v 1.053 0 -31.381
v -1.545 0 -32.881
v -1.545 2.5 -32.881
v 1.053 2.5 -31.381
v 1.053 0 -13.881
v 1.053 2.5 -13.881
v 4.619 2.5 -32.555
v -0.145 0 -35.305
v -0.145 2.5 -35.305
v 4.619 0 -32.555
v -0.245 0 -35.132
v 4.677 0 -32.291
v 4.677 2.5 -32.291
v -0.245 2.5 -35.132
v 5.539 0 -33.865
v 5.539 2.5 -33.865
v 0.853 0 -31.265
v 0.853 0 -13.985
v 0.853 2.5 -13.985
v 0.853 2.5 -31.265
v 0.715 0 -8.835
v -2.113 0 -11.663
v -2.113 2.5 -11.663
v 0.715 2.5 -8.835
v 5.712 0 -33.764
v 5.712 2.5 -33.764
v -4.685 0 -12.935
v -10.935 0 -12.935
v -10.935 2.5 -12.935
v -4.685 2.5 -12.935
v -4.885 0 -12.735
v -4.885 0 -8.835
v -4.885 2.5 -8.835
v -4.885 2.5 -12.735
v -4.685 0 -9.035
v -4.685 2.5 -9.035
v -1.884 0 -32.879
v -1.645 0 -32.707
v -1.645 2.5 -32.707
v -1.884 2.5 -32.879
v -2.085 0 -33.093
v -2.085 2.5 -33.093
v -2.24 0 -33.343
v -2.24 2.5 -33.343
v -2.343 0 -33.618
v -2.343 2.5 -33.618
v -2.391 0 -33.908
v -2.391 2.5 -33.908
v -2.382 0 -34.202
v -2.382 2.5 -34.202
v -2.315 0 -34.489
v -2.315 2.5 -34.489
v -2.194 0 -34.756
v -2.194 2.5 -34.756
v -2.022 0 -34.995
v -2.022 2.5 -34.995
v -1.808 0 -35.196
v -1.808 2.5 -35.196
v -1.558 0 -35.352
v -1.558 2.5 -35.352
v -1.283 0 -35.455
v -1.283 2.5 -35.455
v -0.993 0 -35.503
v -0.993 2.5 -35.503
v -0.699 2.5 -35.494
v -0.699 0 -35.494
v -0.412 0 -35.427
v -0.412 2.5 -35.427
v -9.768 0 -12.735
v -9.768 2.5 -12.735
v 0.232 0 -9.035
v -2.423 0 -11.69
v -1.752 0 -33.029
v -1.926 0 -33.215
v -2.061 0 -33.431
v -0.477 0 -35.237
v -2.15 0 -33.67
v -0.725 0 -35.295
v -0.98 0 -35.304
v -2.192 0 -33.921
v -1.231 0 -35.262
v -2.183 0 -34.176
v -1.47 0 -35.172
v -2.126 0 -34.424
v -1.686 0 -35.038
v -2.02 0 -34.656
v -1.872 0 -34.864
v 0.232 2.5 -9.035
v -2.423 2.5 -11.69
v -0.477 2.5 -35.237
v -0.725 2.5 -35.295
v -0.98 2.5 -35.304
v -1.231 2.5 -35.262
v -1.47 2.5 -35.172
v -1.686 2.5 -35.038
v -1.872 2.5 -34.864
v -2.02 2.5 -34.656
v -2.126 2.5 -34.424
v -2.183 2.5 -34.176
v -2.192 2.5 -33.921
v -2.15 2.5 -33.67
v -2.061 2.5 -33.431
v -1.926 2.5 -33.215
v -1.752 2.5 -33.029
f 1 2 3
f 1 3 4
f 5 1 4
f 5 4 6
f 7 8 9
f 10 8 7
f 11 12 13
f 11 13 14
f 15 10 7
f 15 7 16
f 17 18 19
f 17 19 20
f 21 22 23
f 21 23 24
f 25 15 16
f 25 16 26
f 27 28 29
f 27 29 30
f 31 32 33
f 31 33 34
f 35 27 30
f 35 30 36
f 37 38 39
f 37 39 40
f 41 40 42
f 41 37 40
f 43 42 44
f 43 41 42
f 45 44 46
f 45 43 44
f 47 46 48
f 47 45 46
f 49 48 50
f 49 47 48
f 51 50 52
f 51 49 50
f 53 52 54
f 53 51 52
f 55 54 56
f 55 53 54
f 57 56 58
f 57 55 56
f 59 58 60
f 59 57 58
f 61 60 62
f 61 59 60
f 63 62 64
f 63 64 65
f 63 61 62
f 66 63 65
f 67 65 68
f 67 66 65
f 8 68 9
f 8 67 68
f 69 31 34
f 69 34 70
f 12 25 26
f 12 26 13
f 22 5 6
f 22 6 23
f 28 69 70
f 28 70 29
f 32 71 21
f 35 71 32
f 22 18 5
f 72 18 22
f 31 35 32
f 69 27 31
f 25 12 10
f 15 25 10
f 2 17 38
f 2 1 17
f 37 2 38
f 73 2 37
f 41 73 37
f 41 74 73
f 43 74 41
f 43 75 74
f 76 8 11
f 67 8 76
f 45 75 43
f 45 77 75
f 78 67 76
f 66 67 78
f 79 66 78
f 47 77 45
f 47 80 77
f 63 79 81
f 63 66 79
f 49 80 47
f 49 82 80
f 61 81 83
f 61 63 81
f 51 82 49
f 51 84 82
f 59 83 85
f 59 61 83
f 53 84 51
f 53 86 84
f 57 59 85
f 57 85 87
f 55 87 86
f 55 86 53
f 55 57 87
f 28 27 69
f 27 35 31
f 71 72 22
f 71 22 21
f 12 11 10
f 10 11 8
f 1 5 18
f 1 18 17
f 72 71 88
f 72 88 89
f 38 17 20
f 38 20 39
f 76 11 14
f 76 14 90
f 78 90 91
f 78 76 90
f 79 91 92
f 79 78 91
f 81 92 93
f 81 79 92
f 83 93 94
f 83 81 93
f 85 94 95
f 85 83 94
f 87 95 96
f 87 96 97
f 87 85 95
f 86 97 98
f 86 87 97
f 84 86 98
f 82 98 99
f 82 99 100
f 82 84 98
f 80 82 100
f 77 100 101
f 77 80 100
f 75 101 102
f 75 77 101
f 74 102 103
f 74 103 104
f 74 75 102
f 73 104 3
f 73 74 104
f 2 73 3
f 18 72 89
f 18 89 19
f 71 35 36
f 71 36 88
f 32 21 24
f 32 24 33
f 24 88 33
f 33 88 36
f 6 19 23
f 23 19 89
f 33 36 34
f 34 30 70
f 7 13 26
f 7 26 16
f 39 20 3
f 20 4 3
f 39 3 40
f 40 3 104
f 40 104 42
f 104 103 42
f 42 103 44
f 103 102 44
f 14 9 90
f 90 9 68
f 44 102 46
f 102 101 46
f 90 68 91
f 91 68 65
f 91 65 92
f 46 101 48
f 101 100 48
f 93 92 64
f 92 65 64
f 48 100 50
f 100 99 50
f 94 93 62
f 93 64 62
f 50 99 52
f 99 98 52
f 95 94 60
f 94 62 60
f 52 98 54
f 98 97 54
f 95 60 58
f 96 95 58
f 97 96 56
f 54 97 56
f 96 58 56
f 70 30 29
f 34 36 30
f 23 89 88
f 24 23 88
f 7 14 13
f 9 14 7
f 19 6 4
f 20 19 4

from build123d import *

# Parameters (mm, degrees)
EXTRUDE_1_DEPTH = 2.5


with BuildPart() as part:
    # 草图1 → 凸台-拉伸1 (new body)
    with BuildSketch(Plane(origin=(0, 0, 0), x_dir=(1, 0, 0), z_dir=(0, 1, 0))):
        with BuildLine():
            Line((-10.934737319, 12.934852592), (-4.684737319, 12.934852592))
            Line((-4.684737319, 12.934852592), (-4.684737319, 9.034852592))
            Line((-4.684737319, 9.034852592), (0.232419968, 9.034852592))
            Line((0.232419968, 9.034852592), (-2.42312521, 11.69039777))
            Line((-2.42312521, 11.69039777), (0.853482967, 13.984703515))
            Line((0.853482967, 13.984703515), (0.853482967, 31.265120051))
            Line((0.853482967, 31.265120051), (-1.644593244, 32.707385024))
            ThreePointArc((-1.644593244, 32.707385024), (-2.19363135, 34.75642313), (-0.144593244, 35.305461236))
            Line((-0.144593244, 35.305461236), (4.618546477, 32.555461236))
            Line((4.618546477, 32.555461236), (5.538541961, 33.864509863))
            Line((5.538541961, 33.864509863), (5.712435322, 33.764112484))
            Line((5.712435322, 33.764112484), (4.676983419, 32.290782544))
            Line((4.676983419, 32.290782544), (-0.244593244, 35.132256155))
            ThreePointArc((-0.244593244, 35.132256155), (-2.020426269, 34.65642313), (-1.544593244, 32.880590105))
            Line((-1.544593244, 32.880590105), (1.053482967, 31.380590105))
            Line((1.053482967, 31.380590105), (1.053482967, 13.880590105))
            Line((1.053482967, 13.880590105), (-2.113164444, 11.663279717))
            Line((-2.113164444, 11.663279717), (0.715262681, 8.834852592))
            Line((0.715262681, 8.834852592), (-4.884737319, 8.834852592))
            Line((-4.884737319, 8.834852592), (-4.884737319, 12.734852592))
            Line((-4.884737319, 12.734852592), (-9.767685017, 12.734852592))
            Line((-9.767685017, 12.734852592), (-10.934737319, 12.934852592))
        make_face()
    extrude(amount=EXTRUDE_1_DEPTH)


solid = part.part
